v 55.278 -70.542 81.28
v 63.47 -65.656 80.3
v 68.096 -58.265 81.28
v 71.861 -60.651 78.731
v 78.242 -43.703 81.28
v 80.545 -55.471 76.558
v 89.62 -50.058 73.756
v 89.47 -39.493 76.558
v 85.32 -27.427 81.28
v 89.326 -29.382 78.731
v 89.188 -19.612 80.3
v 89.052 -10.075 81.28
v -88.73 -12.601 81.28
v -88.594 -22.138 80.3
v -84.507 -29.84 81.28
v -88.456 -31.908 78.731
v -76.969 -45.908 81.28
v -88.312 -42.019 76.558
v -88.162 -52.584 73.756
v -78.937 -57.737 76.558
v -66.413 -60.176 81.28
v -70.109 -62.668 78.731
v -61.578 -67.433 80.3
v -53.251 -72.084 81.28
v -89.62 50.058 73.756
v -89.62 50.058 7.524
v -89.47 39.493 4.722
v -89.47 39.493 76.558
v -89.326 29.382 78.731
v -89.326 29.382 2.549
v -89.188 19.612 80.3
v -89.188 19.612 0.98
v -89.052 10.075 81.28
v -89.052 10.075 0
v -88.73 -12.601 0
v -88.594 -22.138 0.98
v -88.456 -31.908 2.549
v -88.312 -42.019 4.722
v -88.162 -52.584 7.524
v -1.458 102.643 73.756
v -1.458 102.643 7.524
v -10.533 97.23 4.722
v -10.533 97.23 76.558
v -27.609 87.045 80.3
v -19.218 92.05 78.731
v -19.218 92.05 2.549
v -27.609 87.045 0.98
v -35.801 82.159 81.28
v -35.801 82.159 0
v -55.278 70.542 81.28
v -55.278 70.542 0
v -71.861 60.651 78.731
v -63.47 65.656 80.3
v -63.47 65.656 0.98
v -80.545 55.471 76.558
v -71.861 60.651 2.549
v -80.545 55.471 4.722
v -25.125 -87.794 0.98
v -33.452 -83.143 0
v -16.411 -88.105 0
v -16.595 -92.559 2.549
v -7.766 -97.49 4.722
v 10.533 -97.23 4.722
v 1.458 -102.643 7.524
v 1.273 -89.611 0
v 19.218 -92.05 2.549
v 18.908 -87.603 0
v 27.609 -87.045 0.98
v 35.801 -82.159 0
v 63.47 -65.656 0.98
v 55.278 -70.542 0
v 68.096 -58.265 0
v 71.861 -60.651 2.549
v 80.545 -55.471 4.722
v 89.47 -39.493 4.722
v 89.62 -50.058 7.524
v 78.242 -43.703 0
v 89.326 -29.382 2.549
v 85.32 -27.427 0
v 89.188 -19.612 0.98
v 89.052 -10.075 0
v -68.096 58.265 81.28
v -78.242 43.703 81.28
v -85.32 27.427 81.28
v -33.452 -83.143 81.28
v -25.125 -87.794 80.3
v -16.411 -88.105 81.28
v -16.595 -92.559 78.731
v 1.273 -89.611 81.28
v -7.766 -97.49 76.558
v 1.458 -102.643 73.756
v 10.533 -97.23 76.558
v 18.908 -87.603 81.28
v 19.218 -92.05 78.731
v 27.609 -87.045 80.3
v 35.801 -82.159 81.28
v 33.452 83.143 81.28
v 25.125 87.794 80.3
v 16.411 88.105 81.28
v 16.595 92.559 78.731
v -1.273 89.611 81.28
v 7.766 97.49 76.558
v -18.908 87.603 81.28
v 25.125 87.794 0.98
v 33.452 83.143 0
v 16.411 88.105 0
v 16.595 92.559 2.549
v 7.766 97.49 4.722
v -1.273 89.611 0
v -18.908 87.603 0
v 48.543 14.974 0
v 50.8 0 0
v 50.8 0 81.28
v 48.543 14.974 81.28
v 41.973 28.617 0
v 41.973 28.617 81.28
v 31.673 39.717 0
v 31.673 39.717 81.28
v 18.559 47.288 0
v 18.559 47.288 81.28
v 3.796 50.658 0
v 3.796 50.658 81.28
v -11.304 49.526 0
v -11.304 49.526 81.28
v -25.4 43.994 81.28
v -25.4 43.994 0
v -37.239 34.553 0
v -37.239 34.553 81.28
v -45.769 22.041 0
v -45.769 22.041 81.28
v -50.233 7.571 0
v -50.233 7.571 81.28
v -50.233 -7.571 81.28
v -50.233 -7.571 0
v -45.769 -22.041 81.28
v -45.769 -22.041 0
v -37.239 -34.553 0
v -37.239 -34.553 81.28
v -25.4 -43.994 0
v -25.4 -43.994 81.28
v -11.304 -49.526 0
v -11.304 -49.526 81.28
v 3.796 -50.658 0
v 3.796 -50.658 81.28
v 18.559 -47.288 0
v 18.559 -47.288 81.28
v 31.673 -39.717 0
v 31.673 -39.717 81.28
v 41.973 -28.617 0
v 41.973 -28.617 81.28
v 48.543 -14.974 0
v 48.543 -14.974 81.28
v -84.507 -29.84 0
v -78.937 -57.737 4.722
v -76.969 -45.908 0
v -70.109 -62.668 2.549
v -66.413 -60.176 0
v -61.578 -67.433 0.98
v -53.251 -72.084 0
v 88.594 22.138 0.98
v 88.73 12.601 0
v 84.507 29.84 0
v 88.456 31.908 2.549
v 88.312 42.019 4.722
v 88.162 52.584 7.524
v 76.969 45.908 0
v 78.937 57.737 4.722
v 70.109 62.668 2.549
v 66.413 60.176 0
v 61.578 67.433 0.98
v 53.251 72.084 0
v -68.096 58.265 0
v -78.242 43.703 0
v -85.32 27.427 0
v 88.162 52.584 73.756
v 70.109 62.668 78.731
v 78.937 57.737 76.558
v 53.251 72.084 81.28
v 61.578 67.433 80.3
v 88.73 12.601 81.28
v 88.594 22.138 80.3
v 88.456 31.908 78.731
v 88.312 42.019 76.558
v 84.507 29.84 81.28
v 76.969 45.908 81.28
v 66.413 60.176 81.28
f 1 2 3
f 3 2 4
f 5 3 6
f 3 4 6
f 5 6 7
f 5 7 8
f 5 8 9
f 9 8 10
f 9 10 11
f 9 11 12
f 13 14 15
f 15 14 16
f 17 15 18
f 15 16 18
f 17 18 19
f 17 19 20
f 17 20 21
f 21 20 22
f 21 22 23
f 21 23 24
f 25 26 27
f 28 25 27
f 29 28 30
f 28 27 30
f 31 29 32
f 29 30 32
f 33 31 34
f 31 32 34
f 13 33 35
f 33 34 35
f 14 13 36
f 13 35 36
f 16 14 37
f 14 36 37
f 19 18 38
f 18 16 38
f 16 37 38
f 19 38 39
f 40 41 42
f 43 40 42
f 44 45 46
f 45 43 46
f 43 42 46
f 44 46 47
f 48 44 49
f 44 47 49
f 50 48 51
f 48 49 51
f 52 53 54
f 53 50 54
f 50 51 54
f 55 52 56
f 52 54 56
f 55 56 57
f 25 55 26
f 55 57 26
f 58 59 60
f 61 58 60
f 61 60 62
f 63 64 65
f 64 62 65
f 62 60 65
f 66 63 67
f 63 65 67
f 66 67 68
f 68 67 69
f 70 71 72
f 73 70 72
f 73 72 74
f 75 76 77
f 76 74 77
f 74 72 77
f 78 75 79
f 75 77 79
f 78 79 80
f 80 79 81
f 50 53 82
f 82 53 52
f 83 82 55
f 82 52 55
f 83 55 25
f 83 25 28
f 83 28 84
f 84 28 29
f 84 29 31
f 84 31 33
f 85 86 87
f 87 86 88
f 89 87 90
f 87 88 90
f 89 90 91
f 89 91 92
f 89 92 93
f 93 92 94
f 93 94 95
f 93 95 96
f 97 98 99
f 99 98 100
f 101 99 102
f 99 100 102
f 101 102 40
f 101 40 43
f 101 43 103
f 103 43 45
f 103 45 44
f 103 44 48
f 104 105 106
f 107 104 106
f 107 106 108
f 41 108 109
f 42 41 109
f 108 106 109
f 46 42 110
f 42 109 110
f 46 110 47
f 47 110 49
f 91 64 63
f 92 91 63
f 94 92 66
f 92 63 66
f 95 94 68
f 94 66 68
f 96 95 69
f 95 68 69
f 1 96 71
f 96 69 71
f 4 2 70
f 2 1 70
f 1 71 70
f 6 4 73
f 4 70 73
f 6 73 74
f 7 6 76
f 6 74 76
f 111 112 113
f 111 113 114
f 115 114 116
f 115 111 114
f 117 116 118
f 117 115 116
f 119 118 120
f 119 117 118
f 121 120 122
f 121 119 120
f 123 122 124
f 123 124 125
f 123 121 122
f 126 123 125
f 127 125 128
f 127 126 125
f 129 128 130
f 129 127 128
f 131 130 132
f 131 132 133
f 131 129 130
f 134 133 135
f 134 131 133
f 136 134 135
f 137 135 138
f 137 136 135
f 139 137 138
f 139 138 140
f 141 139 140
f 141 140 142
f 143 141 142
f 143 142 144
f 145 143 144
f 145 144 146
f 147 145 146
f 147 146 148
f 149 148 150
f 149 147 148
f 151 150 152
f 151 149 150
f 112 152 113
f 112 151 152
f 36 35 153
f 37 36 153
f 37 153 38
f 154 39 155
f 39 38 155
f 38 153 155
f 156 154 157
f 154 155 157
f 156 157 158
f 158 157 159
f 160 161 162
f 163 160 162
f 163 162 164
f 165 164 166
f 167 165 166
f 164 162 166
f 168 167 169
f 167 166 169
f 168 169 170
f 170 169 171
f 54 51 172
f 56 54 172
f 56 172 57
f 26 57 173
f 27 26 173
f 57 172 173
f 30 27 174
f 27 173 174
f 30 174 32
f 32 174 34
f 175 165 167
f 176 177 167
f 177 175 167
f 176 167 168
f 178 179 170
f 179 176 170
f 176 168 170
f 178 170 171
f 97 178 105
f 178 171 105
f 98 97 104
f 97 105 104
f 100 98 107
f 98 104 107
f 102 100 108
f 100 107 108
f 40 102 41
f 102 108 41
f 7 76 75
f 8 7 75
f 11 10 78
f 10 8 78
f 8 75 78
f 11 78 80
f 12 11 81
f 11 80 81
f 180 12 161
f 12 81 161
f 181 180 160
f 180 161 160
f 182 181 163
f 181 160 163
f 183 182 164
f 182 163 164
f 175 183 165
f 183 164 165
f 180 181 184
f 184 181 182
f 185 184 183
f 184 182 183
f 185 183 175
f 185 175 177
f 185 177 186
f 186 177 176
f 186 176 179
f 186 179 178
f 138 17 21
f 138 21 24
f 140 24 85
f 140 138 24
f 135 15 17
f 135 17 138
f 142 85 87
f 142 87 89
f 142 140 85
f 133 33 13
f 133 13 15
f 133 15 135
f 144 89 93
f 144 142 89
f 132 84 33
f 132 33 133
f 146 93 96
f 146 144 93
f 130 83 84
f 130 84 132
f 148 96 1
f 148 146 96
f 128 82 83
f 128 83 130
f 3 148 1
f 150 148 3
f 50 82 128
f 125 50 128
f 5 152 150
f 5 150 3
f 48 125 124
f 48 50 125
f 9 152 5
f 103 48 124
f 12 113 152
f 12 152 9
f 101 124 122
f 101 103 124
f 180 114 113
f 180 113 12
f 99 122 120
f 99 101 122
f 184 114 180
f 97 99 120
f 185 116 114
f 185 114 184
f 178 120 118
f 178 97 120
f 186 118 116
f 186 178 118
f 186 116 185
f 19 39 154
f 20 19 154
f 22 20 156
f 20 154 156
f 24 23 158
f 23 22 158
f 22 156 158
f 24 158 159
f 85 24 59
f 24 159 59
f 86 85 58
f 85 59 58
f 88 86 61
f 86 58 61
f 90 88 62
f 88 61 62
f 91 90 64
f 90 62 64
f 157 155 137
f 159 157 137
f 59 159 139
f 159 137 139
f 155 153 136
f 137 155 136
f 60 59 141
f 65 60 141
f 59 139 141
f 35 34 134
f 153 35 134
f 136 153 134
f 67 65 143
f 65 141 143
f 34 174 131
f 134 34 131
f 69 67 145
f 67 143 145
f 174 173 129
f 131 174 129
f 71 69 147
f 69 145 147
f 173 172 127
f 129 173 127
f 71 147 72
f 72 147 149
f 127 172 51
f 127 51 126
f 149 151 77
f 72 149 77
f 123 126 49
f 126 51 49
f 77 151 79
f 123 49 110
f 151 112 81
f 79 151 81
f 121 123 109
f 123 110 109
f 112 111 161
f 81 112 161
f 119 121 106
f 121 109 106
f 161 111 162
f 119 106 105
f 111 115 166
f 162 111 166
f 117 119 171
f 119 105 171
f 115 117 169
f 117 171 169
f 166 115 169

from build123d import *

# Parameters (mm, degrees)
F0_R     = 50.8
F1_DEPTH = 81.28


with BuildPart() as f1:
    # F0 (on Top) → F1 (new body)
    with BuildSketch(Plane.XY):
        Polygon((88.161778, 52.584354), (-1.458498, 102.642516), (-89.620275, 50.058162), (-88.161778, -52.584354), (1.458498, -102.642516), (89.620275, -50.058162), align=None)
        Circle(F0_R, mode=Mode.SUBTRACT)
    extrude(amount=F1_DEPTH)

    # F2 (on Front) → F3 (revolve, cut)
    with BuildSketch(Plane.XZ):
        Polygon((161.132823, 41.287788), (157.832084, 81.28), (89.620275, 81.28), (160.01082, 40.64), align=None)
        Polygon((161.245103, 41.352613), (161.132823, 41.287788), (161.186287, 40.64), align=None)
        Polygon((161.132823, 39.992212), (160.01082, 40.64), (89.620275, 0), (157.832084, 0), align=None)
        Polygon((161.245103, 39.927387), (161.186287, 40.64), (161.132823, 39.992212), align=None)
    revolve(axis=Axis((0, 0, 40.64), (0, 0, 1)), mode=Mode.SUBTRACT)


solid = f1.part
